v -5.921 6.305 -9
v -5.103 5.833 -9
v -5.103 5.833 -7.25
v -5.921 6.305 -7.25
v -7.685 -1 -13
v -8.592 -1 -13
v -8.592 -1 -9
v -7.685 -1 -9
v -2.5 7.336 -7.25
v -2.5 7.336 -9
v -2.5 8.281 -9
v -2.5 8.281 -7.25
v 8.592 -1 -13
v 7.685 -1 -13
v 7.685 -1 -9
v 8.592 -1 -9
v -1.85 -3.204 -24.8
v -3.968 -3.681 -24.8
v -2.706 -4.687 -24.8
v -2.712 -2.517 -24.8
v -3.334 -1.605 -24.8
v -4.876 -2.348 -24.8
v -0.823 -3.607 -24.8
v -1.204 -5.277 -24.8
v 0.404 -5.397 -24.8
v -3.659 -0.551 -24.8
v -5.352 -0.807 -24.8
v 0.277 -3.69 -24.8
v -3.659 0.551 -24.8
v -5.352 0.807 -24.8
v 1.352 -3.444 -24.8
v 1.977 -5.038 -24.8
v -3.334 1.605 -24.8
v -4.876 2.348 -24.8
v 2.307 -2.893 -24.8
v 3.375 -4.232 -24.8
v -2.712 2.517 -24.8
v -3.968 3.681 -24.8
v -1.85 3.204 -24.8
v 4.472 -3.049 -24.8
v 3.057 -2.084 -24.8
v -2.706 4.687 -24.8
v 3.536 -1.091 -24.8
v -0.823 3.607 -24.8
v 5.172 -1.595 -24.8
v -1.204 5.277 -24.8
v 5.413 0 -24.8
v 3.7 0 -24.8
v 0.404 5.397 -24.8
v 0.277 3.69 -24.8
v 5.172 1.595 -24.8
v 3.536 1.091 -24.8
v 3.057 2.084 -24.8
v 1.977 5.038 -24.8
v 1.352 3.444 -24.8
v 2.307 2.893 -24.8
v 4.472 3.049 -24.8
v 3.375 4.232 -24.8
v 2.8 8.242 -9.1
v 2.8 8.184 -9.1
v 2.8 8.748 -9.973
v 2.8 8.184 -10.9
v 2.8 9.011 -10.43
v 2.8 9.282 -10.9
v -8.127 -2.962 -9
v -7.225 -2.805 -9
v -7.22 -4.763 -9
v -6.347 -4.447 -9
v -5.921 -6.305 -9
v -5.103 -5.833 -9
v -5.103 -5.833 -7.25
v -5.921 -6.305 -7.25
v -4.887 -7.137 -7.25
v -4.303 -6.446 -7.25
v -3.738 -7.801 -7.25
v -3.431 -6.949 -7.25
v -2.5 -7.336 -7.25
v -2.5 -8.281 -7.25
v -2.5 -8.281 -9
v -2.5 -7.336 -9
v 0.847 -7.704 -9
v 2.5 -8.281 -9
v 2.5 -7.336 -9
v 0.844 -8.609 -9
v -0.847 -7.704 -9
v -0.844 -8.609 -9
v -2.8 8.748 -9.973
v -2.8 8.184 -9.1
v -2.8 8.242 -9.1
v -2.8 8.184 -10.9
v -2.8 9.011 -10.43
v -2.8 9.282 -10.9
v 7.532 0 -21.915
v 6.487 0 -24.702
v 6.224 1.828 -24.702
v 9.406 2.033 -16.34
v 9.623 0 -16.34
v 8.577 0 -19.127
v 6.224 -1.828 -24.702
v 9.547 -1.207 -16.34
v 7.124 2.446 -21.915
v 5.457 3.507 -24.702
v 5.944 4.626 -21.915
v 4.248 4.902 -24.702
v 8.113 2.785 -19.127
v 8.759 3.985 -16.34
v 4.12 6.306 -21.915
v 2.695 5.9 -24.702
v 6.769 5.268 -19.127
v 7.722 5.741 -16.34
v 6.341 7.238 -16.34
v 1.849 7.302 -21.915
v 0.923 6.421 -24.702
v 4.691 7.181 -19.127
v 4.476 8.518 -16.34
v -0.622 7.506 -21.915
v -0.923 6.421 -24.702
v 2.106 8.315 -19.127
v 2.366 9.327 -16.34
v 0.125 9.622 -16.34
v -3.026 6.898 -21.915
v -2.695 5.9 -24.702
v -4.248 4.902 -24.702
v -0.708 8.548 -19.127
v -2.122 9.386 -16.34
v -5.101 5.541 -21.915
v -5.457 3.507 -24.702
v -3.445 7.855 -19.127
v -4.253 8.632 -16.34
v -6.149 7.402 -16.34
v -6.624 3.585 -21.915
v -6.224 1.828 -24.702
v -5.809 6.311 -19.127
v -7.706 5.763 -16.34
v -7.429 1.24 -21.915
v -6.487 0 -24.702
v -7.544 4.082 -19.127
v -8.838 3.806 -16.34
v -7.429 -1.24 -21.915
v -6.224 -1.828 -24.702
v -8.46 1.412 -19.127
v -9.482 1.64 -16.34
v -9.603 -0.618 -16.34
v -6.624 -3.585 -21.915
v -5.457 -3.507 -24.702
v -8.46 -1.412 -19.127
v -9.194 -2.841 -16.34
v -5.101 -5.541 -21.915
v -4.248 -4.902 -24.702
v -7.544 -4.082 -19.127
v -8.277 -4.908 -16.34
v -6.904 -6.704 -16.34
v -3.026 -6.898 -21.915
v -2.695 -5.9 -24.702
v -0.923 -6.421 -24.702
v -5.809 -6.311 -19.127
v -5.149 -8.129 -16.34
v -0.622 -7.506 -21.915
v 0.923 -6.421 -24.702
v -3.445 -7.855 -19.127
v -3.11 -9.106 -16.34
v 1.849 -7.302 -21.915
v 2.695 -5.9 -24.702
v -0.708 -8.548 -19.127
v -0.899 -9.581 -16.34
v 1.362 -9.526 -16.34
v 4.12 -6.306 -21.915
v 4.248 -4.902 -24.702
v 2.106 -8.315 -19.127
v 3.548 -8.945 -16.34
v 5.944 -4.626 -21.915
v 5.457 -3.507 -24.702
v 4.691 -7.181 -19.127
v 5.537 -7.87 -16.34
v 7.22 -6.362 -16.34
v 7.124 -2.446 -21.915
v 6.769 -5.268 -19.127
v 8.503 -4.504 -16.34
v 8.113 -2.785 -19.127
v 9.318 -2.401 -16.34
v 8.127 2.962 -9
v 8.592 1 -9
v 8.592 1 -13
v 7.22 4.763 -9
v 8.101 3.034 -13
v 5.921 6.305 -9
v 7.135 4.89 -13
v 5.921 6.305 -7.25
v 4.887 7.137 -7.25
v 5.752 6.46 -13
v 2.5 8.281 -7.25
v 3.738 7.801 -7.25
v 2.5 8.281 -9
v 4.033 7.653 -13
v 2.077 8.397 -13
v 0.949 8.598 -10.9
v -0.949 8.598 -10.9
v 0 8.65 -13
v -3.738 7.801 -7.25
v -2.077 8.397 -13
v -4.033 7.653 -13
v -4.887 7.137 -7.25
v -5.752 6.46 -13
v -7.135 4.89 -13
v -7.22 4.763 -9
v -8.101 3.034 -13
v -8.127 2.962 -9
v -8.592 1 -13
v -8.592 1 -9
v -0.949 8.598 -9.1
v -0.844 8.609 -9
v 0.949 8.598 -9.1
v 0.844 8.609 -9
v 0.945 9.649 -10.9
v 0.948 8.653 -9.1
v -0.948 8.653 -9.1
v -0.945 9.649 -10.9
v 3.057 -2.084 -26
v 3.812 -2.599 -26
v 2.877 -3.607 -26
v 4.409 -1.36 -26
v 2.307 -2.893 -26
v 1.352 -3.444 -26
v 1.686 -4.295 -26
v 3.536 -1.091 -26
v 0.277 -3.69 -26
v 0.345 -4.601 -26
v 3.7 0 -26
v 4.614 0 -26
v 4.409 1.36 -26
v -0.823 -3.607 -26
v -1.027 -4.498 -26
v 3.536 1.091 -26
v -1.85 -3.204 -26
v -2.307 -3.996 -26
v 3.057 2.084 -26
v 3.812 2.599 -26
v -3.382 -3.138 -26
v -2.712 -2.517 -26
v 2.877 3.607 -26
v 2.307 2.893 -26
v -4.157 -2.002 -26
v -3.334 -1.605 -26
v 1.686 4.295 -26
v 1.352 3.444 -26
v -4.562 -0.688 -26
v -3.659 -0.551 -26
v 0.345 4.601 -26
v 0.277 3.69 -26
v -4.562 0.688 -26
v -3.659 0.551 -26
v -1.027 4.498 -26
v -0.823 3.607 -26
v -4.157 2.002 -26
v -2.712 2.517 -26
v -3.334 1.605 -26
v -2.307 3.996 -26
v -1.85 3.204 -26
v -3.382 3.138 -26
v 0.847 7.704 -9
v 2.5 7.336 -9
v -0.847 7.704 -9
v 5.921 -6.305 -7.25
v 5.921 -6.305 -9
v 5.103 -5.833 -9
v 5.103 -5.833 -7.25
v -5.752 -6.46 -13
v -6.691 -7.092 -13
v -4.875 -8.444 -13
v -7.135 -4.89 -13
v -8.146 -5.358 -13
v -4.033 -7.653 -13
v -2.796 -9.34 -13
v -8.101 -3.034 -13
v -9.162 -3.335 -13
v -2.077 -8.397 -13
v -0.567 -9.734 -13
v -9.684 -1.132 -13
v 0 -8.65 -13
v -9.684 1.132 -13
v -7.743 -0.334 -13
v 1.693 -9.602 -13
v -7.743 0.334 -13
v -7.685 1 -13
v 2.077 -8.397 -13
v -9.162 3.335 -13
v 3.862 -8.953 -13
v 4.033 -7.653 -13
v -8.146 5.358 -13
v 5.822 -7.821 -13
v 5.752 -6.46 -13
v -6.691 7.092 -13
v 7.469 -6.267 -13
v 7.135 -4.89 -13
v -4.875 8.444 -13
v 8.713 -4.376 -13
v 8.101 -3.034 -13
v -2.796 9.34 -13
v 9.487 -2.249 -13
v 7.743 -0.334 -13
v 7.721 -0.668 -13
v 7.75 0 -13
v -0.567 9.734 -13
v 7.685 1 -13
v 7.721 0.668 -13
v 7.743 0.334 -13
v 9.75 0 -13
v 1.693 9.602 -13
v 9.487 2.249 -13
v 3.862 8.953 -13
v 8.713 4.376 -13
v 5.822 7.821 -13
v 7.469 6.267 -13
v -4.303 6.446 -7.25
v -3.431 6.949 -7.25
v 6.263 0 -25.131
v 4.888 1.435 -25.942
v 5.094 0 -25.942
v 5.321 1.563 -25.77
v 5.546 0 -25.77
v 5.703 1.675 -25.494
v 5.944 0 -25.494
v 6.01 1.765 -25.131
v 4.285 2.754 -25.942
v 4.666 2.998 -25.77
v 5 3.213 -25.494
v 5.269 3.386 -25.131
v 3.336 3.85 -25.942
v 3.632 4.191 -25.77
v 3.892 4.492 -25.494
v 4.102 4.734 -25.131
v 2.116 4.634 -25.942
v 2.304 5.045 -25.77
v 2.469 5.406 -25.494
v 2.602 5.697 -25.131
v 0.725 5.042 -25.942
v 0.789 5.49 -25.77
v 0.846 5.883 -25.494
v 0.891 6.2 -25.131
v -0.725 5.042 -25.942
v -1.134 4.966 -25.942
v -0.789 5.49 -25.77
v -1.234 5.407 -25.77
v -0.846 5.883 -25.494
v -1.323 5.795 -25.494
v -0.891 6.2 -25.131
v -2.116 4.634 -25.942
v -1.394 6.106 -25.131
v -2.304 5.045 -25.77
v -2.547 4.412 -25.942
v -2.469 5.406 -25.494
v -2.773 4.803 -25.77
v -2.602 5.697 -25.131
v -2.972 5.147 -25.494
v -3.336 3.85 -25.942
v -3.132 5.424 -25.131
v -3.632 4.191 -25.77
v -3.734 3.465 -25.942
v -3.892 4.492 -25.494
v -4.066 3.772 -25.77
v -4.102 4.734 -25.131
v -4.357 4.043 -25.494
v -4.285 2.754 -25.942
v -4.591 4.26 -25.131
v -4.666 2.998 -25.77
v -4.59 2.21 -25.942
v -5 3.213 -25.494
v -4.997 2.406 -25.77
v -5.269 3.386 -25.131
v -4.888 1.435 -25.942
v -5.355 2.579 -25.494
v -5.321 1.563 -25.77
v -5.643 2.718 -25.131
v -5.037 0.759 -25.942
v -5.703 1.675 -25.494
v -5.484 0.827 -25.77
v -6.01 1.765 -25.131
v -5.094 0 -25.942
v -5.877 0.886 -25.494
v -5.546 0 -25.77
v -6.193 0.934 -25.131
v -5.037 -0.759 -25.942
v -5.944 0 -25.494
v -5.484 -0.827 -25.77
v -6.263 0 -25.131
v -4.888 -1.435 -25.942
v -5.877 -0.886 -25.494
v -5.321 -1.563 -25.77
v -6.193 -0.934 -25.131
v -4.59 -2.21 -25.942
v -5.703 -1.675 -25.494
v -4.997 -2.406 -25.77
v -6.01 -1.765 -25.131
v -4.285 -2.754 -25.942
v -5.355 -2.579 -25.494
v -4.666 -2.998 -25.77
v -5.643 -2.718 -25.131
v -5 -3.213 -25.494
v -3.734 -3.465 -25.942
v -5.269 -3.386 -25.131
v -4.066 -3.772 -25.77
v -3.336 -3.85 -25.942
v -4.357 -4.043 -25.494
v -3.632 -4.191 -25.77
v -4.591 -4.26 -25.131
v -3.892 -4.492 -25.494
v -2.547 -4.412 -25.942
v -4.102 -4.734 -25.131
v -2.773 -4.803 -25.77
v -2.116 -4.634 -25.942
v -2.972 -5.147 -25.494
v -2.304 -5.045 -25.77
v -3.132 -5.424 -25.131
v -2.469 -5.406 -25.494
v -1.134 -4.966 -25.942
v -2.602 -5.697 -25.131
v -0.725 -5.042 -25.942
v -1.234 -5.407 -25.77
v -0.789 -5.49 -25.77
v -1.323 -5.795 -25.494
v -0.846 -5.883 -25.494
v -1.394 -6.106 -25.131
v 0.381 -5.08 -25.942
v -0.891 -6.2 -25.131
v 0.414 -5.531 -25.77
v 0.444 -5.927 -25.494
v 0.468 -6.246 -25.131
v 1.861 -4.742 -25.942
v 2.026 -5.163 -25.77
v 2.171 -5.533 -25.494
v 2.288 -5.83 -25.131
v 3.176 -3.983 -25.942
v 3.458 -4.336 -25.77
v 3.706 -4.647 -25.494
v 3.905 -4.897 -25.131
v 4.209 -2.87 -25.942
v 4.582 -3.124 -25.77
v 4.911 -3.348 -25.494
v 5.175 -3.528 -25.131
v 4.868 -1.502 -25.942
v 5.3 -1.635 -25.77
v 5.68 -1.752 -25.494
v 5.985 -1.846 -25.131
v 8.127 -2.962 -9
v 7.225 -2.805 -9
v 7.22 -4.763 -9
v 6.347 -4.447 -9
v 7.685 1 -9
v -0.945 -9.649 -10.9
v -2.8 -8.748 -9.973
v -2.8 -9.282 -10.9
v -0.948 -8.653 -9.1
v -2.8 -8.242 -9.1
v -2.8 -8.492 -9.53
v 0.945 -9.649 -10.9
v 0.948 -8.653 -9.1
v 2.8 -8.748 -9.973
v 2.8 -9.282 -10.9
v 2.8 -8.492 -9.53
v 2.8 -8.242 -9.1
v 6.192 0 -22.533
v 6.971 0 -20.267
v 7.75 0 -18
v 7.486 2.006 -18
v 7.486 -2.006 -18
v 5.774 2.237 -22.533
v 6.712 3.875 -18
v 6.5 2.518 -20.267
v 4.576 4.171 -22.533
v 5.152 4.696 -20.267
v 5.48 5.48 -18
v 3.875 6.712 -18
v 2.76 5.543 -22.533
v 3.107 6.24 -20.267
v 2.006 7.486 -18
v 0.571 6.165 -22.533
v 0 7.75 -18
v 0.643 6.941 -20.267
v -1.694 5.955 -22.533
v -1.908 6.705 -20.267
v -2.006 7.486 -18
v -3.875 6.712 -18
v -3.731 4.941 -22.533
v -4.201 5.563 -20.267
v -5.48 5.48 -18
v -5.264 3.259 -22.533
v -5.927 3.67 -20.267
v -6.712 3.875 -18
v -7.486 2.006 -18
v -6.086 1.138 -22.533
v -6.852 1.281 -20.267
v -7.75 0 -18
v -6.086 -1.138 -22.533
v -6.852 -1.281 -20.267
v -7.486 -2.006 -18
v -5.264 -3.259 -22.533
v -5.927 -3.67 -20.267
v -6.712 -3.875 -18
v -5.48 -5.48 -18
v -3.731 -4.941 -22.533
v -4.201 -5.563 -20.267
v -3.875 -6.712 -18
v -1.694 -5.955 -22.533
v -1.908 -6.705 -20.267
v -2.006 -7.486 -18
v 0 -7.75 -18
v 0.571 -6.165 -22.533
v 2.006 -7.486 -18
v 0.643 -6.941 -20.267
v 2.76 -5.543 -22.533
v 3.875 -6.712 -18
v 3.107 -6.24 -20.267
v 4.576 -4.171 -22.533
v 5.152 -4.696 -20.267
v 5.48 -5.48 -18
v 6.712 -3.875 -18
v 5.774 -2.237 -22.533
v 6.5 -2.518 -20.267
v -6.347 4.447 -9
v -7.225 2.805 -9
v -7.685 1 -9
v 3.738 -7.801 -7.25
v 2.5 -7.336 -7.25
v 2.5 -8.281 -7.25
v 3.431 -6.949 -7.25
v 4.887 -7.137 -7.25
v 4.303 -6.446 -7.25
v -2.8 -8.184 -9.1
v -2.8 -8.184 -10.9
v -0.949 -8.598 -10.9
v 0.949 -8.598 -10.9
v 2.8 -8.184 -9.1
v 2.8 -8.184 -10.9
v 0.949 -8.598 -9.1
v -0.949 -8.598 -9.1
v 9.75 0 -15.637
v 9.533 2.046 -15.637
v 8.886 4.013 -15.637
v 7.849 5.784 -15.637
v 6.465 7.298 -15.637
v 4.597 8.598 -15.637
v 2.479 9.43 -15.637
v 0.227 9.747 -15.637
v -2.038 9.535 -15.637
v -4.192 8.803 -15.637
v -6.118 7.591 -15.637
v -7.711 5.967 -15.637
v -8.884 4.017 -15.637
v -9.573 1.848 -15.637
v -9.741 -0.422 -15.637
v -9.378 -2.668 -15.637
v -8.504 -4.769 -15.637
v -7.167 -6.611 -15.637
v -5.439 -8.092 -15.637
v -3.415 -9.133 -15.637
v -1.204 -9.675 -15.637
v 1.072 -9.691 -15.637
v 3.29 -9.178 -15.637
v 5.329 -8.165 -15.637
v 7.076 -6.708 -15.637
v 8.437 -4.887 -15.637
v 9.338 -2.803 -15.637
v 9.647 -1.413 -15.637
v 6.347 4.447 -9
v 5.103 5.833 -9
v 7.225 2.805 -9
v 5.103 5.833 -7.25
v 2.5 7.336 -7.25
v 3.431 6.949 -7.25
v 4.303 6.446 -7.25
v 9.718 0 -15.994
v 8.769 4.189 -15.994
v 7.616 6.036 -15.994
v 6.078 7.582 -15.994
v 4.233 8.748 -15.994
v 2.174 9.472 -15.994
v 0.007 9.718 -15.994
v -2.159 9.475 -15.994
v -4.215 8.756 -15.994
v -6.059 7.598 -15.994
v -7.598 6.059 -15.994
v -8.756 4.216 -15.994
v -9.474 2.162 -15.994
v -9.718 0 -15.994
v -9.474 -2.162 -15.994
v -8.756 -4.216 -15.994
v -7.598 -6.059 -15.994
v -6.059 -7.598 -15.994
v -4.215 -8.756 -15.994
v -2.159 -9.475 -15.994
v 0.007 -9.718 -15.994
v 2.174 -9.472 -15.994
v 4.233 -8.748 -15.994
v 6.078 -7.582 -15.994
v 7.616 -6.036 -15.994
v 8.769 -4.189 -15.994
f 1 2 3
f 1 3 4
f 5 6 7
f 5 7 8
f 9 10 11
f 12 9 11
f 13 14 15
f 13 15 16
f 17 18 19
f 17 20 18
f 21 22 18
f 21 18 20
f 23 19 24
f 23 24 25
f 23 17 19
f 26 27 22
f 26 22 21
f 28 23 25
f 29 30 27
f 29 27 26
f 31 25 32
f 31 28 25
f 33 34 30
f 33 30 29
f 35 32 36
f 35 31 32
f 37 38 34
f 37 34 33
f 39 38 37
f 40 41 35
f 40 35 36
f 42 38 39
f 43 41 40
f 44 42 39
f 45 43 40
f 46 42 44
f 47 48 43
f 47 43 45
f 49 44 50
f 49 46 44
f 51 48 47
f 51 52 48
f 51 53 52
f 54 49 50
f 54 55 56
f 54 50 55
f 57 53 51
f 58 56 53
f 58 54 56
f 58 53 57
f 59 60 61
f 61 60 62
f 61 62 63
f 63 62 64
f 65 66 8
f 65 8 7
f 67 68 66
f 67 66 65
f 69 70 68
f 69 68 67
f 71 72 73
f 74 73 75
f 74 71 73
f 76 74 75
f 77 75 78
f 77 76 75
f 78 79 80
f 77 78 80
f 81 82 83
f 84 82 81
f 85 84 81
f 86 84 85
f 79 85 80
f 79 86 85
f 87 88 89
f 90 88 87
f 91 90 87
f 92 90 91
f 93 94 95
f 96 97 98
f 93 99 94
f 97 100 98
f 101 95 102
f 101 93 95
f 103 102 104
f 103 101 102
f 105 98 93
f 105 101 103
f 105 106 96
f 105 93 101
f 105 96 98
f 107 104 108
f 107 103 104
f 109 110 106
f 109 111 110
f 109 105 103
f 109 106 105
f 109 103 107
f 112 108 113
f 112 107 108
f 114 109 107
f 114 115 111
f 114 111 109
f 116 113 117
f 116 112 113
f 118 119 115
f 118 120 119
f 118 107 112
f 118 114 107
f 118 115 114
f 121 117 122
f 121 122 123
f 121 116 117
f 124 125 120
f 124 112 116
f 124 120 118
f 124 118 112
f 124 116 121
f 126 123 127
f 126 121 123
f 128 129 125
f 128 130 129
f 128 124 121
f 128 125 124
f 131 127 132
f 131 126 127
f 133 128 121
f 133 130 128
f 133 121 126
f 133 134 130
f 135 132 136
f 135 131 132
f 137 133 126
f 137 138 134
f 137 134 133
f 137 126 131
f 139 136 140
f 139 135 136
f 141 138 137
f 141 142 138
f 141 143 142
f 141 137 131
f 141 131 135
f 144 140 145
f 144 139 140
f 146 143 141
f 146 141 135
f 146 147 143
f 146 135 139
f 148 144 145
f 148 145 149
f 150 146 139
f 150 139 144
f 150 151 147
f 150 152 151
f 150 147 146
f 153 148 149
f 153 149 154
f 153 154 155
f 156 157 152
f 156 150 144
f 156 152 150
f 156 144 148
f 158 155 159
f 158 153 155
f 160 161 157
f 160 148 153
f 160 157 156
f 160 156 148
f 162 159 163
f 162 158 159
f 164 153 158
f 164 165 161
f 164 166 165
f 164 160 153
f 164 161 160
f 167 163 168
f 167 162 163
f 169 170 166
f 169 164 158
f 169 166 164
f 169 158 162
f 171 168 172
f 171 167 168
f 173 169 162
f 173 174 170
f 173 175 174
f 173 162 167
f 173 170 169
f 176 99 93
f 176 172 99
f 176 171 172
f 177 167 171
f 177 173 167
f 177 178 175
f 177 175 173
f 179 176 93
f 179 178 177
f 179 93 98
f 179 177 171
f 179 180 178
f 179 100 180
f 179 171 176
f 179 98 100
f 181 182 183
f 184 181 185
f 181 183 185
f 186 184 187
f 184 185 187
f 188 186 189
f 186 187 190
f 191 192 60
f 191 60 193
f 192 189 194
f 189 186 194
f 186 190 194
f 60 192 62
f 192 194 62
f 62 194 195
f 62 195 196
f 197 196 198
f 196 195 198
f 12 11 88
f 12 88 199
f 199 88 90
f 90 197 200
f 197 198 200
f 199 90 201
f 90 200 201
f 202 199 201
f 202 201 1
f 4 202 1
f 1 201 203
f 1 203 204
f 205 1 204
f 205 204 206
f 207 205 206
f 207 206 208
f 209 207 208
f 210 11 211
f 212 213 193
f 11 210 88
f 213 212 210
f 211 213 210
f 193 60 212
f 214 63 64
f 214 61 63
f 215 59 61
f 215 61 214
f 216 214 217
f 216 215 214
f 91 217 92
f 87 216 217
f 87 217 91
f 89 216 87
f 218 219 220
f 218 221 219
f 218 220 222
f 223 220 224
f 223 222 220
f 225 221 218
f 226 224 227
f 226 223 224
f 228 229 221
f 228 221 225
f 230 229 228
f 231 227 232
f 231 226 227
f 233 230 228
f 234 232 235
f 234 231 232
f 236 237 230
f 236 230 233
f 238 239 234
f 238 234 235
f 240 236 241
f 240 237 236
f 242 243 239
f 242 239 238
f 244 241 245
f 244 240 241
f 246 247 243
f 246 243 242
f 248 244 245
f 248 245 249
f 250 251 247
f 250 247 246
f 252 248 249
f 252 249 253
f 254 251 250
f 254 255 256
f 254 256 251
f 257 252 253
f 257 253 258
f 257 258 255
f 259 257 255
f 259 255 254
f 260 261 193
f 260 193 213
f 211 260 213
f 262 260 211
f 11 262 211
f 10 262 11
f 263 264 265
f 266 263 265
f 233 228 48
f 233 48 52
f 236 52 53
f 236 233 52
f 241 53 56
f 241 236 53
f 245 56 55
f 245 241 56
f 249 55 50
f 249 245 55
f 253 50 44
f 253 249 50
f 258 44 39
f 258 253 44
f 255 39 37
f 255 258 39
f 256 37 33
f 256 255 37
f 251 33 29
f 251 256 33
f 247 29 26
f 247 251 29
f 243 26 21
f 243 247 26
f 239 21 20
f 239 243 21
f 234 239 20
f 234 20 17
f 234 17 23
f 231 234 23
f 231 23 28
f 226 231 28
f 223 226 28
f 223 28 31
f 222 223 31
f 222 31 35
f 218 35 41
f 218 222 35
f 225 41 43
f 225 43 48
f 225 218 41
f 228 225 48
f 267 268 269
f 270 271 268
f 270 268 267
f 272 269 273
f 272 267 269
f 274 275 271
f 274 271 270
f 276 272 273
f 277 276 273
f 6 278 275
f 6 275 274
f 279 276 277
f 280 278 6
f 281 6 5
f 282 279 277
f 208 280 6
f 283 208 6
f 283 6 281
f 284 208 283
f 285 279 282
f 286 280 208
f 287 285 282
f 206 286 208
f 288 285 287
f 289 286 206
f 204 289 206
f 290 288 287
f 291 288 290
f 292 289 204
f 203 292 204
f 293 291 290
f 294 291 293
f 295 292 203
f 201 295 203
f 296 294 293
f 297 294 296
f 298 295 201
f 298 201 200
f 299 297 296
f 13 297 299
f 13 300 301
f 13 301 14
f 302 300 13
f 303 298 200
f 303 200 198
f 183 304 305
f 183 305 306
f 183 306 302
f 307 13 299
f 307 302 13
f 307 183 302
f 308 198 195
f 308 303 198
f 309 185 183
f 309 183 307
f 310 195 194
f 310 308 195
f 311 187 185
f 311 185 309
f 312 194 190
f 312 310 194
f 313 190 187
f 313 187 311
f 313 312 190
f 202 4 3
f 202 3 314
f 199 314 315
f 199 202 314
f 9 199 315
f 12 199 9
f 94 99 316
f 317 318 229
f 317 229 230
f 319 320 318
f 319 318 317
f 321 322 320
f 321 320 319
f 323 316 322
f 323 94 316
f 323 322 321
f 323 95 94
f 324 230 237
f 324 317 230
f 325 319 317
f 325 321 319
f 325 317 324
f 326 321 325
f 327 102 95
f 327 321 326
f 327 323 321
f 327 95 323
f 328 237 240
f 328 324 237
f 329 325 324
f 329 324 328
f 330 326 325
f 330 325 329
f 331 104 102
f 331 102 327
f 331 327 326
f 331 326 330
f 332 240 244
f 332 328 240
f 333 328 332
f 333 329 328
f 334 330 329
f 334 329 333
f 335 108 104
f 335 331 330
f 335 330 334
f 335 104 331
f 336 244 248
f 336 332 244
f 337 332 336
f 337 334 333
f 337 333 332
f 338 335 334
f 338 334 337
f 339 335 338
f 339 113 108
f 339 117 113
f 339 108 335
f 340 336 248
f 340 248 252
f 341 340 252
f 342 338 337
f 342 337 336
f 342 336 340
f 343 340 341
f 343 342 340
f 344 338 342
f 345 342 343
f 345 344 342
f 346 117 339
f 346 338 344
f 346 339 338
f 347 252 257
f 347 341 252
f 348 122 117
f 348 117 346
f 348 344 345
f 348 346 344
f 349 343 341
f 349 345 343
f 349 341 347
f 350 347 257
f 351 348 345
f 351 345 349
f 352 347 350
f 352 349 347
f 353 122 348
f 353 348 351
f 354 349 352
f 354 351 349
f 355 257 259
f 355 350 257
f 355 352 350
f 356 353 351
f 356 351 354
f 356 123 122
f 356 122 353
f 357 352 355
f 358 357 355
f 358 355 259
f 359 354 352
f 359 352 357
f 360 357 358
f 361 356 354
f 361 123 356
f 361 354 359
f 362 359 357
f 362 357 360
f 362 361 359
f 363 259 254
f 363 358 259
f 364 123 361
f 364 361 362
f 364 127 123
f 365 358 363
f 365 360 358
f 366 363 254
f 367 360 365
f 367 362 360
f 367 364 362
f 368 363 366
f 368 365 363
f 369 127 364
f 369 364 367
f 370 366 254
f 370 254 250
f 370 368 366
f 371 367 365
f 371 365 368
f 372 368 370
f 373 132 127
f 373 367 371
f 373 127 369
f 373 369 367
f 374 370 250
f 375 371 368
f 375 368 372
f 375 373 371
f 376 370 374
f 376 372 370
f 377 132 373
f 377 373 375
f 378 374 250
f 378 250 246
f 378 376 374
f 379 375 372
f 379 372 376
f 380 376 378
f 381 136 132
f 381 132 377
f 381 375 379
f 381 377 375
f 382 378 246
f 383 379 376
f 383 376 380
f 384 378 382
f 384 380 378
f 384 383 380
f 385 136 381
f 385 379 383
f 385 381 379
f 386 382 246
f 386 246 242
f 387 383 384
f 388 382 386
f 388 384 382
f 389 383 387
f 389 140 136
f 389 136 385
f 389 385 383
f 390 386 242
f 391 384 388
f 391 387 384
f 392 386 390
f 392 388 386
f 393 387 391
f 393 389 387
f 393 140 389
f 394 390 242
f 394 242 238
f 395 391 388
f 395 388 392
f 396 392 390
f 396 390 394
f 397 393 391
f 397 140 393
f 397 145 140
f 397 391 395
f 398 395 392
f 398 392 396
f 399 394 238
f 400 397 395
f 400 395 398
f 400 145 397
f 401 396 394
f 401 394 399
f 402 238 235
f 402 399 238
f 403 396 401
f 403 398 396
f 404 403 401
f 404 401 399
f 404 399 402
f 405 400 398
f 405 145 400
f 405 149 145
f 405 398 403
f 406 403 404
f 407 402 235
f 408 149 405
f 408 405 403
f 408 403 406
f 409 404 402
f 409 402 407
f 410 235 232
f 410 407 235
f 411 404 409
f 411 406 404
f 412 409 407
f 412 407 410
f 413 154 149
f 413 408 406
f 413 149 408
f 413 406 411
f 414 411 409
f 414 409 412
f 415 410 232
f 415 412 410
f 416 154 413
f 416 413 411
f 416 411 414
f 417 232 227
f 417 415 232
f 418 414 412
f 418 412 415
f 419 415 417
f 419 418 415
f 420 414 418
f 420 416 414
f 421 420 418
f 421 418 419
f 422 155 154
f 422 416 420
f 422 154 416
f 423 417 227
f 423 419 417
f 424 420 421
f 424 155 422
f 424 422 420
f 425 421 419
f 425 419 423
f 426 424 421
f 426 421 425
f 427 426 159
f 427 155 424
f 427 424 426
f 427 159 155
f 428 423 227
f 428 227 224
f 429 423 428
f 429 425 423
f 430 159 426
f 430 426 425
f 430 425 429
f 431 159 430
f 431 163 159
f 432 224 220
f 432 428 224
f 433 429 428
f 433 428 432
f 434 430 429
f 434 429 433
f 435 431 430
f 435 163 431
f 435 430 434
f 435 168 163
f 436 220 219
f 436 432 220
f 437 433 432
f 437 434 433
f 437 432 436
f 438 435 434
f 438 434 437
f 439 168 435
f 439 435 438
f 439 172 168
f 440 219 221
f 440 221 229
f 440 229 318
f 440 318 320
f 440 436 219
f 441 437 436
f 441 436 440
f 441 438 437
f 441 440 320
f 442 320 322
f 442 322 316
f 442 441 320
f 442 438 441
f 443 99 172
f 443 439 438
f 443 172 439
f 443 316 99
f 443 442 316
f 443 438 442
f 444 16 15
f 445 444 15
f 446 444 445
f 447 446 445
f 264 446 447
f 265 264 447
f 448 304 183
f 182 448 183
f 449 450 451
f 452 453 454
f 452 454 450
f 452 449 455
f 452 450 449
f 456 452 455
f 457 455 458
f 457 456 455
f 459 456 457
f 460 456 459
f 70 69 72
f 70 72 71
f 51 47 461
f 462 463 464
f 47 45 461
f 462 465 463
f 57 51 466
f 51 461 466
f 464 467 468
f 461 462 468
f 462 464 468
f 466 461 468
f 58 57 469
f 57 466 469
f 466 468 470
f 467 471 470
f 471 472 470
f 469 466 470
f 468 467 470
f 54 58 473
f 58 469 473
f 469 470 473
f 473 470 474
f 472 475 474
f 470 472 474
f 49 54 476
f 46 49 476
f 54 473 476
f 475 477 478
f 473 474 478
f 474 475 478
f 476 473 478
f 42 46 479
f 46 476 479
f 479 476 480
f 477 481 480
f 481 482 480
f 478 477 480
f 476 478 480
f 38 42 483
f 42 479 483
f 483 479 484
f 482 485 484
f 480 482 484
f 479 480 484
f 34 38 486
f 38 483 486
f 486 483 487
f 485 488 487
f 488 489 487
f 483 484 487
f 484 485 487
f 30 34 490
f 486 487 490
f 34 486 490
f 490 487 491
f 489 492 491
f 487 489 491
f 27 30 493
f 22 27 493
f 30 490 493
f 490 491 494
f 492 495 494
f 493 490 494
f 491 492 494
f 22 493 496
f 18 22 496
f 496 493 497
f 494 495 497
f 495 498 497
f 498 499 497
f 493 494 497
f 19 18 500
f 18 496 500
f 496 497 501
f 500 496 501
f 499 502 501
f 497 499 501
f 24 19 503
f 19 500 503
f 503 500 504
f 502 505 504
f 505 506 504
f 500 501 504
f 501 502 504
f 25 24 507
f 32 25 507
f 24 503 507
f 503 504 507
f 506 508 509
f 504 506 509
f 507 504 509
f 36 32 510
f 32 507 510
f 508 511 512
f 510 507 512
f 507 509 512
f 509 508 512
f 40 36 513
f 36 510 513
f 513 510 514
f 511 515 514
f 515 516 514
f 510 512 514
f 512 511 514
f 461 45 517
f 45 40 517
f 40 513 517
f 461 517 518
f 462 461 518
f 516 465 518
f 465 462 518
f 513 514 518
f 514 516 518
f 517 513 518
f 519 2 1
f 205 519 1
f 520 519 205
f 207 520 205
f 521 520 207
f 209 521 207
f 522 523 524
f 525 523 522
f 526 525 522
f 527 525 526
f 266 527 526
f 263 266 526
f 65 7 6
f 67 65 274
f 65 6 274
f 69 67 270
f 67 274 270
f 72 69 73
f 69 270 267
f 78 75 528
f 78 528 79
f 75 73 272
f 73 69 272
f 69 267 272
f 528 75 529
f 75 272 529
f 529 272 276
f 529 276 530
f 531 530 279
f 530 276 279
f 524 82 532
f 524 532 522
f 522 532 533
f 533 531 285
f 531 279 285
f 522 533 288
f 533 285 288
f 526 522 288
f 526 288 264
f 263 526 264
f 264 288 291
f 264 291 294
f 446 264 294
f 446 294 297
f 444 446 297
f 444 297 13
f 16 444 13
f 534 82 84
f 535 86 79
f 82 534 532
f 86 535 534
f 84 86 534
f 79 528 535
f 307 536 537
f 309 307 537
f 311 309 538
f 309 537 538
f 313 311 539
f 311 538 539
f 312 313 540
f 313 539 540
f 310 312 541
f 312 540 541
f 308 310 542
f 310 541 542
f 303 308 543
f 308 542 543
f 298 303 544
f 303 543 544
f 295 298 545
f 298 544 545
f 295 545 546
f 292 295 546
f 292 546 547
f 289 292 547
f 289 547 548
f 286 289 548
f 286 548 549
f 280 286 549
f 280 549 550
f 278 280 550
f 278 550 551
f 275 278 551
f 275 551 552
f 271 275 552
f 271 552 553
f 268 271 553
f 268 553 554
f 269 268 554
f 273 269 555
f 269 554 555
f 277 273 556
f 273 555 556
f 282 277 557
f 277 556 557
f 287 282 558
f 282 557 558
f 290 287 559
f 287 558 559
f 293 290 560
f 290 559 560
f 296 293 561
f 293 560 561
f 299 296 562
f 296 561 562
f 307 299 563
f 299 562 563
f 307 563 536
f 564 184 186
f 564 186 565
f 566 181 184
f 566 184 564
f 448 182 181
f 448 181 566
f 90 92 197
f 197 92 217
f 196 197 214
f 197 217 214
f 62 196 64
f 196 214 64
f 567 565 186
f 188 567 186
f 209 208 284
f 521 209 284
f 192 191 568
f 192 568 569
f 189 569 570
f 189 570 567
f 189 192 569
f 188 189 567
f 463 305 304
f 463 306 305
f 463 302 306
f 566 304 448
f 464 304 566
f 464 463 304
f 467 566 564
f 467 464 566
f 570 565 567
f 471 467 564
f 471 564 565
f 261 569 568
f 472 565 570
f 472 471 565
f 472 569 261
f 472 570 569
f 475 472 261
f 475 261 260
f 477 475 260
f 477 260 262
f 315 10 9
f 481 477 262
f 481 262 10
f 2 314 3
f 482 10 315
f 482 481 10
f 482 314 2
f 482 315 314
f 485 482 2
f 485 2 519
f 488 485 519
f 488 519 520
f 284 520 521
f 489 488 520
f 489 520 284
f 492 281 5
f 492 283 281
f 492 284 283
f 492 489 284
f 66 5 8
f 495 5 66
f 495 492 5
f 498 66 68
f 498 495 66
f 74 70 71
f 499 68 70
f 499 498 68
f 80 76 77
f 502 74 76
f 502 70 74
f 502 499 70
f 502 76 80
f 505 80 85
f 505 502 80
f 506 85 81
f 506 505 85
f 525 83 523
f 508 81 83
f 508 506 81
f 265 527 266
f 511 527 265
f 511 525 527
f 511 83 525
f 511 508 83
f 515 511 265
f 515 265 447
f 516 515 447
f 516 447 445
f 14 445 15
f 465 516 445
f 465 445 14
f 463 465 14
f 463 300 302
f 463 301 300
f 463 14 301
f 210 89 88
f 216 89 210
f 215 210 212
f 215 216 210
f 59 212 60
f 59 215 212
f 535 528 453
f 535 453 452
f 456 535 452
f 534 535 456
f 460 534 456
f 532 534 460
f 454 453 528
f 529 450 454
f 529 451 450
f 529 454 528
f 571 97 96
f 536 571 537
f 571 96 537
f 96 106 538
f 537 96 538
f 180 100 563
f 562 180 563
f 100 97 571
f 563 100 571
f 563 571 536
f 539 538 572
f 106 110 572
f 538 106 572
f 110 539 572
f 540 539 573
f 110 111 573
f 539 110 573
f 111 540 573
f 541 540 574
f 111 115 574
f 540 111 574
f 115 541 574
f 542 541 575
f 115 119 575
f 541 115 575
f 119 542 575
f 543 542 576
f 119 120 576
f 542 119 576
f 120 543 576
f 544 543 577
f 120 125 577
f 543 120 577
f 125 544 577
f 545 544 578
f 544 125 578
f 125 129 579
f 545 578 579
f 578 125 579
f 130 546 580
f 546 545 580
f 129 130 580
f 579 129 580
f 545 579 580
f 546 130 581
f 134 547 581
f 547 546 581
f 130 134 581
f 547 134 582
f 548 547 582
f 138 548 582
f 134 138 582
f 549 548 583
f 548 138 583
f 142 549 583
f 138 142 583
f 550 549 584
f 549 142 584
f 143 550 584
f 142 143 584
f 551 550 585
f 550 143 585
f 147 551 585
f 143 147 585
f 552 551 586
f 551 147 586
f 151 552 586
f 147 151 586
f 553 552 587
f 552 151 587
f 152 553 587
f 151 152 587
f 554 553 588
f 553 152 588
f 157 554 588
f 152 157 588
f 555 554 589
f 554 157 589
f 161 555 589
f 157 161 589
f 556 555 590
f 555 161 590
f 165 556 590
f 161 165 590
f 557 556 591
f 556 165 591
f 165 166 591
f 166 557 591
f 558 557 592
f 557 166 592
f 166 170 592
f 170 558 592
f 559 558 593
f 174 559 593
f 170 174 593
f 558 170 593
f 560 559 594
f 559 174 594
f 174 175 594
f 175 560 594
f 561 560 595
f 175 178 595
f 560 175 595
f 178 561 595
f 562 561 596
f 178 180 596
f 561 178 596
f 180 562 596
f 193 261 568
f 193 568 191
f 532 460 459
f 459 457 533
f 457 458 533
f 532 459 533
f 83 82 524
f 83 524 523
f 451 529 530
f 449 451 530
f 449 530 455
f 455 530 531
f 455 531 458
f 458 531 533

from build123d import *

# Parameters (mm, degrees)
BOX029_W               = 20
BOX029_H               = 5
BOX029_DEPTH           = 2
BOX029_PLACEMENT_ANGLE = 30
BOX027_W               = 20
BOX027_H               = 5
BOX027_DEPTH           = 2
BOX028_W               = 20
BOX028_H               = 5
BOX028_DEPTH           = 2
BOX028_PLACEMENT_ANGLE = 150
BOX030_W               = 20
BOX030_H               = 5
BOX030_DEPTH           = 2
BOX008_W               = 20
BOX008_H               = 2
BOX008_DEPTH           = 6
CYLINDER039_R          = 3.7
CYLINDER039_DEPTH      = 1.2
CYLINDER038_R          = 6
CYLINDER038_DEPTH      = 1.2
CYLINDER036_R          = 7.75
CYLINDER036_DEPTH      = 11
CYLINDER035_R          = 7.3
CYLINDER035_DEPTH      = 11
BOX007_W               = 5.6
BOX007_H               = 20
BOX007_DEPTH           = 1.8
CYLINDER037_R          = 9.75
CYLINDER037_DEPTH      = 3
CYLINDER_R             = 8.65
CYLINDER_DEPTH         = 5.75
FILLET002_R            = 2


with BuildPart() as cube029:
    # Box029 → Box029 (new body)
    with BuildSketch(Plane.XY):
        with Locations((10, 2.5)):
            Rectangle(BOX029_W, BOX029_H)
    extrude(amount=BOX029_DEPTH)


with BuildPart() as cube029_1:
    # Box029 placement: moved
    add(cube029.part.moved(Location((-7.410254, -7.165064, -1))).rotate(Axis((-7.410254, -7.165064, -1), (0, 0, 1)), BOX029_PLACEMENT_ANGLE))


with BuildPart() as cube027:
    # Box027 → Box027 (new body)
    with BuildSketch(Plane(origin=(2.5, -10, -1), x_dir=(0, 1, 0), z_dir=(0, 0, 1))):
        with Locations((10, 2.5)):
            Rectangle(BOX027_W, BOX027_H)
    extrude(amount=BOX027_DEPTH)


with BuildPart() as cube028:
    # Box028 → Box028 (new body)
    with BuildSketch(Plane.XY):
        with Locations((10, 2.5)):
            Rectangle(BOX028_W, BOX028_H)
    extrude(amount=BOX028_DEPTH)


with BuildPart() as cube028_1:
    # Box028 placement: moved
    add(cube028.part.moved(Location((9.910254, -2.834936, -1))).rotate(Axis((9.910254, -2.834936, -1), (0, 0, 1)), BOX028_PLACEMENT_ANGLE))


with BuildPart() as cube030:
    # Box030 → Box030 (new body)
    with BuildSketch(Plane(origin=(10, 2.5, -1), x_dir=(-1, 0, 0), z_dir=(0, 0, 1))):
        with Locations((10, 2.5)):
            Rectangle(BOX030_W, BOX030_H)
    extrude(amount=BOX030_DEPTH)


with BuildPart() as fusion022:
    # Box008 → Box008 (new body)
    with BuildSketch(Plane(origin=(-10, -1, -5), x_dir=(1, 0, 0), z_dir=(0, 0, 1))):
        with Locations((10, 1)):
            Rectangle(BOX008_W, BOX008_H)
    extrude(amount=BOX008_DEPTH)

    # Fusion022: union Cube029, Cube027, Cube028, Cube030
    add(cube029_1.part)
    add(cube027.part)
    add(cube028_1.part)
    add(cube030.part)


with BuildPart() as cylinder037:
    # Cylinder039 → Cylinder039 (new body)
    with BuildSketch(Plane.XY.offset(-18)):
        Circle(CYLINDER039_R)
    extrude(amount=CYLINDER039_DEPTH)


with BuildPart() as top:
    # Cylinder038 → Cylinder038 (new body)
    with BuildSketch(Plane.XY.offset(-18)):
        Circle(CYLINDER038_R)
    extrude(amount=CYLINDER038_DEPTH)

    # Cut013004: cut Cylinder037
    add(cylinder037.part, mode=Mode.SUBTRACT)


with BuildPart() as cylinder034:
    # Cylinder036 → Cylinder036 (new body)
    with BuildSketch(Plane.XY.offset(-10)):
        Circle(CYLINDER036_R)
    extrude(amount=CYLINDER036_DEPTH)


with BuildPart() as fusion015:
    # Cone003 → Cone003 (revolve)
    with BuildSketch(Plane(origin=(0, 0, -18), x_dir=(1, 0, 0), z_dir=(0, -1, 0))):
        Polygon((0, 0), (5, 0), (7.75, 8), (0, 8), align=None)
    revolve(axis=Axis((0, 0, -18), (0, 0, 1)))

    # Fusion015: union Cylinder034
    add(cylinder034.part)


with BuildPart() as cylinder033:
    # Cylinder035 → Cylinder035 (new body)
    with BuildSketch(Plane.XY.offset(-9)):
        Circle(CYLINDER035_R)
    extrude(amount=CYLINDER035_DEPTH)


with BuildPart() as cube007:
    # Box007 → Box007 (new body)
    with BuildSketch(Plane(origin=(-2.8, -10, -7.9), x_dir=(1, 0, 0), z_dir=(0, 0, 1))):
        with Locations((2.8, 10)):
            Rectangle(BOX007_W, BOX007_H)
    extrude(amount=BOX007_DEPTH)


with BuildPart() as clips:
    # Cone002 → Cone002 (revolve)
    with BuildSketch(Plane(origin=(0, 0, -8), x_dir=(1, 0, 0), z_dir=(0, -1, 0))):
        Polygon((0, 0), (9.75, 0), (8.65, 2), (0, 2), align=None)
    revolve(axis=Axis((0, 0, -8), (0, 0, 1)))

    # Common: intersect Cube007
    add(cube007.part, mode=Mode.INTERSECT)

    # Cut013002: cut Cylinder033
    add(cylinder033.part, mode=Mode.SUBTRACT)


with BuildPart() as clips_1:
    # Cut013002 placement: moved
    add(clips.part.moved(Location((0, 0, 5))))


with BuildPart() as cylinder035:
    # Cylinder037 → Cylinder037 (new body)
    with BuildSketch(Plane.XY.offset(-8)):
        Circle(CYLINDER037_R)
    extrude(amount=CYLINDER037_DEPTH)


with BuildPart() as cylinder:
    # Cylinder → Cylinder (new body)
    with BuildSketch(Plane.XY.offset(-5)):
        Circle(CYLINDER_R)
    extrude(amount=CYLINDER_DEPTH)


with BuildPart() as connector_body:
    # Cone → Cone (revolve)
    with BuildSketch(Plane(origin=(0, 0, -18), x_dir=(1, 0, 0), z_dir=(0, -1, 0))):
        Polygon((0, 0), (6, 0), (9.75, 10), (0, 10), align=None)
    revolve(axis=Axis((0, 0, -18), (0, 0, 1)))

    # Fusion014: union Clips, Cylinder035, Cylinder
    add(clips_1.part)
    add(cylinder035.part)
    add(cylinder.part)

    # Cut013003: cut Fusion015
    add(fusion015.part, mode=Mode.SUBTRACT)

    # Fusion021: union Top
    add(top.part)

    # Fillet002
    fillet002_edges = [connector_body.edges().sort_by_distance(p)[0] for p in [
        (-9.75, 0, -8),
        (-6, 0, -18),
    ]]
    fillet(fillet002_edges, radius=FILLET002_R)

    # Cut013011: cut Fusion022
    add(fusion022.part, mode=Mode.SUBTRACT)


with BuildPart() as connector_body_1:
    # Cut013011 placement: moved
    add(connector_body.part.moved(Location((0, 0, -8))))


solid = connector_body_1.part
